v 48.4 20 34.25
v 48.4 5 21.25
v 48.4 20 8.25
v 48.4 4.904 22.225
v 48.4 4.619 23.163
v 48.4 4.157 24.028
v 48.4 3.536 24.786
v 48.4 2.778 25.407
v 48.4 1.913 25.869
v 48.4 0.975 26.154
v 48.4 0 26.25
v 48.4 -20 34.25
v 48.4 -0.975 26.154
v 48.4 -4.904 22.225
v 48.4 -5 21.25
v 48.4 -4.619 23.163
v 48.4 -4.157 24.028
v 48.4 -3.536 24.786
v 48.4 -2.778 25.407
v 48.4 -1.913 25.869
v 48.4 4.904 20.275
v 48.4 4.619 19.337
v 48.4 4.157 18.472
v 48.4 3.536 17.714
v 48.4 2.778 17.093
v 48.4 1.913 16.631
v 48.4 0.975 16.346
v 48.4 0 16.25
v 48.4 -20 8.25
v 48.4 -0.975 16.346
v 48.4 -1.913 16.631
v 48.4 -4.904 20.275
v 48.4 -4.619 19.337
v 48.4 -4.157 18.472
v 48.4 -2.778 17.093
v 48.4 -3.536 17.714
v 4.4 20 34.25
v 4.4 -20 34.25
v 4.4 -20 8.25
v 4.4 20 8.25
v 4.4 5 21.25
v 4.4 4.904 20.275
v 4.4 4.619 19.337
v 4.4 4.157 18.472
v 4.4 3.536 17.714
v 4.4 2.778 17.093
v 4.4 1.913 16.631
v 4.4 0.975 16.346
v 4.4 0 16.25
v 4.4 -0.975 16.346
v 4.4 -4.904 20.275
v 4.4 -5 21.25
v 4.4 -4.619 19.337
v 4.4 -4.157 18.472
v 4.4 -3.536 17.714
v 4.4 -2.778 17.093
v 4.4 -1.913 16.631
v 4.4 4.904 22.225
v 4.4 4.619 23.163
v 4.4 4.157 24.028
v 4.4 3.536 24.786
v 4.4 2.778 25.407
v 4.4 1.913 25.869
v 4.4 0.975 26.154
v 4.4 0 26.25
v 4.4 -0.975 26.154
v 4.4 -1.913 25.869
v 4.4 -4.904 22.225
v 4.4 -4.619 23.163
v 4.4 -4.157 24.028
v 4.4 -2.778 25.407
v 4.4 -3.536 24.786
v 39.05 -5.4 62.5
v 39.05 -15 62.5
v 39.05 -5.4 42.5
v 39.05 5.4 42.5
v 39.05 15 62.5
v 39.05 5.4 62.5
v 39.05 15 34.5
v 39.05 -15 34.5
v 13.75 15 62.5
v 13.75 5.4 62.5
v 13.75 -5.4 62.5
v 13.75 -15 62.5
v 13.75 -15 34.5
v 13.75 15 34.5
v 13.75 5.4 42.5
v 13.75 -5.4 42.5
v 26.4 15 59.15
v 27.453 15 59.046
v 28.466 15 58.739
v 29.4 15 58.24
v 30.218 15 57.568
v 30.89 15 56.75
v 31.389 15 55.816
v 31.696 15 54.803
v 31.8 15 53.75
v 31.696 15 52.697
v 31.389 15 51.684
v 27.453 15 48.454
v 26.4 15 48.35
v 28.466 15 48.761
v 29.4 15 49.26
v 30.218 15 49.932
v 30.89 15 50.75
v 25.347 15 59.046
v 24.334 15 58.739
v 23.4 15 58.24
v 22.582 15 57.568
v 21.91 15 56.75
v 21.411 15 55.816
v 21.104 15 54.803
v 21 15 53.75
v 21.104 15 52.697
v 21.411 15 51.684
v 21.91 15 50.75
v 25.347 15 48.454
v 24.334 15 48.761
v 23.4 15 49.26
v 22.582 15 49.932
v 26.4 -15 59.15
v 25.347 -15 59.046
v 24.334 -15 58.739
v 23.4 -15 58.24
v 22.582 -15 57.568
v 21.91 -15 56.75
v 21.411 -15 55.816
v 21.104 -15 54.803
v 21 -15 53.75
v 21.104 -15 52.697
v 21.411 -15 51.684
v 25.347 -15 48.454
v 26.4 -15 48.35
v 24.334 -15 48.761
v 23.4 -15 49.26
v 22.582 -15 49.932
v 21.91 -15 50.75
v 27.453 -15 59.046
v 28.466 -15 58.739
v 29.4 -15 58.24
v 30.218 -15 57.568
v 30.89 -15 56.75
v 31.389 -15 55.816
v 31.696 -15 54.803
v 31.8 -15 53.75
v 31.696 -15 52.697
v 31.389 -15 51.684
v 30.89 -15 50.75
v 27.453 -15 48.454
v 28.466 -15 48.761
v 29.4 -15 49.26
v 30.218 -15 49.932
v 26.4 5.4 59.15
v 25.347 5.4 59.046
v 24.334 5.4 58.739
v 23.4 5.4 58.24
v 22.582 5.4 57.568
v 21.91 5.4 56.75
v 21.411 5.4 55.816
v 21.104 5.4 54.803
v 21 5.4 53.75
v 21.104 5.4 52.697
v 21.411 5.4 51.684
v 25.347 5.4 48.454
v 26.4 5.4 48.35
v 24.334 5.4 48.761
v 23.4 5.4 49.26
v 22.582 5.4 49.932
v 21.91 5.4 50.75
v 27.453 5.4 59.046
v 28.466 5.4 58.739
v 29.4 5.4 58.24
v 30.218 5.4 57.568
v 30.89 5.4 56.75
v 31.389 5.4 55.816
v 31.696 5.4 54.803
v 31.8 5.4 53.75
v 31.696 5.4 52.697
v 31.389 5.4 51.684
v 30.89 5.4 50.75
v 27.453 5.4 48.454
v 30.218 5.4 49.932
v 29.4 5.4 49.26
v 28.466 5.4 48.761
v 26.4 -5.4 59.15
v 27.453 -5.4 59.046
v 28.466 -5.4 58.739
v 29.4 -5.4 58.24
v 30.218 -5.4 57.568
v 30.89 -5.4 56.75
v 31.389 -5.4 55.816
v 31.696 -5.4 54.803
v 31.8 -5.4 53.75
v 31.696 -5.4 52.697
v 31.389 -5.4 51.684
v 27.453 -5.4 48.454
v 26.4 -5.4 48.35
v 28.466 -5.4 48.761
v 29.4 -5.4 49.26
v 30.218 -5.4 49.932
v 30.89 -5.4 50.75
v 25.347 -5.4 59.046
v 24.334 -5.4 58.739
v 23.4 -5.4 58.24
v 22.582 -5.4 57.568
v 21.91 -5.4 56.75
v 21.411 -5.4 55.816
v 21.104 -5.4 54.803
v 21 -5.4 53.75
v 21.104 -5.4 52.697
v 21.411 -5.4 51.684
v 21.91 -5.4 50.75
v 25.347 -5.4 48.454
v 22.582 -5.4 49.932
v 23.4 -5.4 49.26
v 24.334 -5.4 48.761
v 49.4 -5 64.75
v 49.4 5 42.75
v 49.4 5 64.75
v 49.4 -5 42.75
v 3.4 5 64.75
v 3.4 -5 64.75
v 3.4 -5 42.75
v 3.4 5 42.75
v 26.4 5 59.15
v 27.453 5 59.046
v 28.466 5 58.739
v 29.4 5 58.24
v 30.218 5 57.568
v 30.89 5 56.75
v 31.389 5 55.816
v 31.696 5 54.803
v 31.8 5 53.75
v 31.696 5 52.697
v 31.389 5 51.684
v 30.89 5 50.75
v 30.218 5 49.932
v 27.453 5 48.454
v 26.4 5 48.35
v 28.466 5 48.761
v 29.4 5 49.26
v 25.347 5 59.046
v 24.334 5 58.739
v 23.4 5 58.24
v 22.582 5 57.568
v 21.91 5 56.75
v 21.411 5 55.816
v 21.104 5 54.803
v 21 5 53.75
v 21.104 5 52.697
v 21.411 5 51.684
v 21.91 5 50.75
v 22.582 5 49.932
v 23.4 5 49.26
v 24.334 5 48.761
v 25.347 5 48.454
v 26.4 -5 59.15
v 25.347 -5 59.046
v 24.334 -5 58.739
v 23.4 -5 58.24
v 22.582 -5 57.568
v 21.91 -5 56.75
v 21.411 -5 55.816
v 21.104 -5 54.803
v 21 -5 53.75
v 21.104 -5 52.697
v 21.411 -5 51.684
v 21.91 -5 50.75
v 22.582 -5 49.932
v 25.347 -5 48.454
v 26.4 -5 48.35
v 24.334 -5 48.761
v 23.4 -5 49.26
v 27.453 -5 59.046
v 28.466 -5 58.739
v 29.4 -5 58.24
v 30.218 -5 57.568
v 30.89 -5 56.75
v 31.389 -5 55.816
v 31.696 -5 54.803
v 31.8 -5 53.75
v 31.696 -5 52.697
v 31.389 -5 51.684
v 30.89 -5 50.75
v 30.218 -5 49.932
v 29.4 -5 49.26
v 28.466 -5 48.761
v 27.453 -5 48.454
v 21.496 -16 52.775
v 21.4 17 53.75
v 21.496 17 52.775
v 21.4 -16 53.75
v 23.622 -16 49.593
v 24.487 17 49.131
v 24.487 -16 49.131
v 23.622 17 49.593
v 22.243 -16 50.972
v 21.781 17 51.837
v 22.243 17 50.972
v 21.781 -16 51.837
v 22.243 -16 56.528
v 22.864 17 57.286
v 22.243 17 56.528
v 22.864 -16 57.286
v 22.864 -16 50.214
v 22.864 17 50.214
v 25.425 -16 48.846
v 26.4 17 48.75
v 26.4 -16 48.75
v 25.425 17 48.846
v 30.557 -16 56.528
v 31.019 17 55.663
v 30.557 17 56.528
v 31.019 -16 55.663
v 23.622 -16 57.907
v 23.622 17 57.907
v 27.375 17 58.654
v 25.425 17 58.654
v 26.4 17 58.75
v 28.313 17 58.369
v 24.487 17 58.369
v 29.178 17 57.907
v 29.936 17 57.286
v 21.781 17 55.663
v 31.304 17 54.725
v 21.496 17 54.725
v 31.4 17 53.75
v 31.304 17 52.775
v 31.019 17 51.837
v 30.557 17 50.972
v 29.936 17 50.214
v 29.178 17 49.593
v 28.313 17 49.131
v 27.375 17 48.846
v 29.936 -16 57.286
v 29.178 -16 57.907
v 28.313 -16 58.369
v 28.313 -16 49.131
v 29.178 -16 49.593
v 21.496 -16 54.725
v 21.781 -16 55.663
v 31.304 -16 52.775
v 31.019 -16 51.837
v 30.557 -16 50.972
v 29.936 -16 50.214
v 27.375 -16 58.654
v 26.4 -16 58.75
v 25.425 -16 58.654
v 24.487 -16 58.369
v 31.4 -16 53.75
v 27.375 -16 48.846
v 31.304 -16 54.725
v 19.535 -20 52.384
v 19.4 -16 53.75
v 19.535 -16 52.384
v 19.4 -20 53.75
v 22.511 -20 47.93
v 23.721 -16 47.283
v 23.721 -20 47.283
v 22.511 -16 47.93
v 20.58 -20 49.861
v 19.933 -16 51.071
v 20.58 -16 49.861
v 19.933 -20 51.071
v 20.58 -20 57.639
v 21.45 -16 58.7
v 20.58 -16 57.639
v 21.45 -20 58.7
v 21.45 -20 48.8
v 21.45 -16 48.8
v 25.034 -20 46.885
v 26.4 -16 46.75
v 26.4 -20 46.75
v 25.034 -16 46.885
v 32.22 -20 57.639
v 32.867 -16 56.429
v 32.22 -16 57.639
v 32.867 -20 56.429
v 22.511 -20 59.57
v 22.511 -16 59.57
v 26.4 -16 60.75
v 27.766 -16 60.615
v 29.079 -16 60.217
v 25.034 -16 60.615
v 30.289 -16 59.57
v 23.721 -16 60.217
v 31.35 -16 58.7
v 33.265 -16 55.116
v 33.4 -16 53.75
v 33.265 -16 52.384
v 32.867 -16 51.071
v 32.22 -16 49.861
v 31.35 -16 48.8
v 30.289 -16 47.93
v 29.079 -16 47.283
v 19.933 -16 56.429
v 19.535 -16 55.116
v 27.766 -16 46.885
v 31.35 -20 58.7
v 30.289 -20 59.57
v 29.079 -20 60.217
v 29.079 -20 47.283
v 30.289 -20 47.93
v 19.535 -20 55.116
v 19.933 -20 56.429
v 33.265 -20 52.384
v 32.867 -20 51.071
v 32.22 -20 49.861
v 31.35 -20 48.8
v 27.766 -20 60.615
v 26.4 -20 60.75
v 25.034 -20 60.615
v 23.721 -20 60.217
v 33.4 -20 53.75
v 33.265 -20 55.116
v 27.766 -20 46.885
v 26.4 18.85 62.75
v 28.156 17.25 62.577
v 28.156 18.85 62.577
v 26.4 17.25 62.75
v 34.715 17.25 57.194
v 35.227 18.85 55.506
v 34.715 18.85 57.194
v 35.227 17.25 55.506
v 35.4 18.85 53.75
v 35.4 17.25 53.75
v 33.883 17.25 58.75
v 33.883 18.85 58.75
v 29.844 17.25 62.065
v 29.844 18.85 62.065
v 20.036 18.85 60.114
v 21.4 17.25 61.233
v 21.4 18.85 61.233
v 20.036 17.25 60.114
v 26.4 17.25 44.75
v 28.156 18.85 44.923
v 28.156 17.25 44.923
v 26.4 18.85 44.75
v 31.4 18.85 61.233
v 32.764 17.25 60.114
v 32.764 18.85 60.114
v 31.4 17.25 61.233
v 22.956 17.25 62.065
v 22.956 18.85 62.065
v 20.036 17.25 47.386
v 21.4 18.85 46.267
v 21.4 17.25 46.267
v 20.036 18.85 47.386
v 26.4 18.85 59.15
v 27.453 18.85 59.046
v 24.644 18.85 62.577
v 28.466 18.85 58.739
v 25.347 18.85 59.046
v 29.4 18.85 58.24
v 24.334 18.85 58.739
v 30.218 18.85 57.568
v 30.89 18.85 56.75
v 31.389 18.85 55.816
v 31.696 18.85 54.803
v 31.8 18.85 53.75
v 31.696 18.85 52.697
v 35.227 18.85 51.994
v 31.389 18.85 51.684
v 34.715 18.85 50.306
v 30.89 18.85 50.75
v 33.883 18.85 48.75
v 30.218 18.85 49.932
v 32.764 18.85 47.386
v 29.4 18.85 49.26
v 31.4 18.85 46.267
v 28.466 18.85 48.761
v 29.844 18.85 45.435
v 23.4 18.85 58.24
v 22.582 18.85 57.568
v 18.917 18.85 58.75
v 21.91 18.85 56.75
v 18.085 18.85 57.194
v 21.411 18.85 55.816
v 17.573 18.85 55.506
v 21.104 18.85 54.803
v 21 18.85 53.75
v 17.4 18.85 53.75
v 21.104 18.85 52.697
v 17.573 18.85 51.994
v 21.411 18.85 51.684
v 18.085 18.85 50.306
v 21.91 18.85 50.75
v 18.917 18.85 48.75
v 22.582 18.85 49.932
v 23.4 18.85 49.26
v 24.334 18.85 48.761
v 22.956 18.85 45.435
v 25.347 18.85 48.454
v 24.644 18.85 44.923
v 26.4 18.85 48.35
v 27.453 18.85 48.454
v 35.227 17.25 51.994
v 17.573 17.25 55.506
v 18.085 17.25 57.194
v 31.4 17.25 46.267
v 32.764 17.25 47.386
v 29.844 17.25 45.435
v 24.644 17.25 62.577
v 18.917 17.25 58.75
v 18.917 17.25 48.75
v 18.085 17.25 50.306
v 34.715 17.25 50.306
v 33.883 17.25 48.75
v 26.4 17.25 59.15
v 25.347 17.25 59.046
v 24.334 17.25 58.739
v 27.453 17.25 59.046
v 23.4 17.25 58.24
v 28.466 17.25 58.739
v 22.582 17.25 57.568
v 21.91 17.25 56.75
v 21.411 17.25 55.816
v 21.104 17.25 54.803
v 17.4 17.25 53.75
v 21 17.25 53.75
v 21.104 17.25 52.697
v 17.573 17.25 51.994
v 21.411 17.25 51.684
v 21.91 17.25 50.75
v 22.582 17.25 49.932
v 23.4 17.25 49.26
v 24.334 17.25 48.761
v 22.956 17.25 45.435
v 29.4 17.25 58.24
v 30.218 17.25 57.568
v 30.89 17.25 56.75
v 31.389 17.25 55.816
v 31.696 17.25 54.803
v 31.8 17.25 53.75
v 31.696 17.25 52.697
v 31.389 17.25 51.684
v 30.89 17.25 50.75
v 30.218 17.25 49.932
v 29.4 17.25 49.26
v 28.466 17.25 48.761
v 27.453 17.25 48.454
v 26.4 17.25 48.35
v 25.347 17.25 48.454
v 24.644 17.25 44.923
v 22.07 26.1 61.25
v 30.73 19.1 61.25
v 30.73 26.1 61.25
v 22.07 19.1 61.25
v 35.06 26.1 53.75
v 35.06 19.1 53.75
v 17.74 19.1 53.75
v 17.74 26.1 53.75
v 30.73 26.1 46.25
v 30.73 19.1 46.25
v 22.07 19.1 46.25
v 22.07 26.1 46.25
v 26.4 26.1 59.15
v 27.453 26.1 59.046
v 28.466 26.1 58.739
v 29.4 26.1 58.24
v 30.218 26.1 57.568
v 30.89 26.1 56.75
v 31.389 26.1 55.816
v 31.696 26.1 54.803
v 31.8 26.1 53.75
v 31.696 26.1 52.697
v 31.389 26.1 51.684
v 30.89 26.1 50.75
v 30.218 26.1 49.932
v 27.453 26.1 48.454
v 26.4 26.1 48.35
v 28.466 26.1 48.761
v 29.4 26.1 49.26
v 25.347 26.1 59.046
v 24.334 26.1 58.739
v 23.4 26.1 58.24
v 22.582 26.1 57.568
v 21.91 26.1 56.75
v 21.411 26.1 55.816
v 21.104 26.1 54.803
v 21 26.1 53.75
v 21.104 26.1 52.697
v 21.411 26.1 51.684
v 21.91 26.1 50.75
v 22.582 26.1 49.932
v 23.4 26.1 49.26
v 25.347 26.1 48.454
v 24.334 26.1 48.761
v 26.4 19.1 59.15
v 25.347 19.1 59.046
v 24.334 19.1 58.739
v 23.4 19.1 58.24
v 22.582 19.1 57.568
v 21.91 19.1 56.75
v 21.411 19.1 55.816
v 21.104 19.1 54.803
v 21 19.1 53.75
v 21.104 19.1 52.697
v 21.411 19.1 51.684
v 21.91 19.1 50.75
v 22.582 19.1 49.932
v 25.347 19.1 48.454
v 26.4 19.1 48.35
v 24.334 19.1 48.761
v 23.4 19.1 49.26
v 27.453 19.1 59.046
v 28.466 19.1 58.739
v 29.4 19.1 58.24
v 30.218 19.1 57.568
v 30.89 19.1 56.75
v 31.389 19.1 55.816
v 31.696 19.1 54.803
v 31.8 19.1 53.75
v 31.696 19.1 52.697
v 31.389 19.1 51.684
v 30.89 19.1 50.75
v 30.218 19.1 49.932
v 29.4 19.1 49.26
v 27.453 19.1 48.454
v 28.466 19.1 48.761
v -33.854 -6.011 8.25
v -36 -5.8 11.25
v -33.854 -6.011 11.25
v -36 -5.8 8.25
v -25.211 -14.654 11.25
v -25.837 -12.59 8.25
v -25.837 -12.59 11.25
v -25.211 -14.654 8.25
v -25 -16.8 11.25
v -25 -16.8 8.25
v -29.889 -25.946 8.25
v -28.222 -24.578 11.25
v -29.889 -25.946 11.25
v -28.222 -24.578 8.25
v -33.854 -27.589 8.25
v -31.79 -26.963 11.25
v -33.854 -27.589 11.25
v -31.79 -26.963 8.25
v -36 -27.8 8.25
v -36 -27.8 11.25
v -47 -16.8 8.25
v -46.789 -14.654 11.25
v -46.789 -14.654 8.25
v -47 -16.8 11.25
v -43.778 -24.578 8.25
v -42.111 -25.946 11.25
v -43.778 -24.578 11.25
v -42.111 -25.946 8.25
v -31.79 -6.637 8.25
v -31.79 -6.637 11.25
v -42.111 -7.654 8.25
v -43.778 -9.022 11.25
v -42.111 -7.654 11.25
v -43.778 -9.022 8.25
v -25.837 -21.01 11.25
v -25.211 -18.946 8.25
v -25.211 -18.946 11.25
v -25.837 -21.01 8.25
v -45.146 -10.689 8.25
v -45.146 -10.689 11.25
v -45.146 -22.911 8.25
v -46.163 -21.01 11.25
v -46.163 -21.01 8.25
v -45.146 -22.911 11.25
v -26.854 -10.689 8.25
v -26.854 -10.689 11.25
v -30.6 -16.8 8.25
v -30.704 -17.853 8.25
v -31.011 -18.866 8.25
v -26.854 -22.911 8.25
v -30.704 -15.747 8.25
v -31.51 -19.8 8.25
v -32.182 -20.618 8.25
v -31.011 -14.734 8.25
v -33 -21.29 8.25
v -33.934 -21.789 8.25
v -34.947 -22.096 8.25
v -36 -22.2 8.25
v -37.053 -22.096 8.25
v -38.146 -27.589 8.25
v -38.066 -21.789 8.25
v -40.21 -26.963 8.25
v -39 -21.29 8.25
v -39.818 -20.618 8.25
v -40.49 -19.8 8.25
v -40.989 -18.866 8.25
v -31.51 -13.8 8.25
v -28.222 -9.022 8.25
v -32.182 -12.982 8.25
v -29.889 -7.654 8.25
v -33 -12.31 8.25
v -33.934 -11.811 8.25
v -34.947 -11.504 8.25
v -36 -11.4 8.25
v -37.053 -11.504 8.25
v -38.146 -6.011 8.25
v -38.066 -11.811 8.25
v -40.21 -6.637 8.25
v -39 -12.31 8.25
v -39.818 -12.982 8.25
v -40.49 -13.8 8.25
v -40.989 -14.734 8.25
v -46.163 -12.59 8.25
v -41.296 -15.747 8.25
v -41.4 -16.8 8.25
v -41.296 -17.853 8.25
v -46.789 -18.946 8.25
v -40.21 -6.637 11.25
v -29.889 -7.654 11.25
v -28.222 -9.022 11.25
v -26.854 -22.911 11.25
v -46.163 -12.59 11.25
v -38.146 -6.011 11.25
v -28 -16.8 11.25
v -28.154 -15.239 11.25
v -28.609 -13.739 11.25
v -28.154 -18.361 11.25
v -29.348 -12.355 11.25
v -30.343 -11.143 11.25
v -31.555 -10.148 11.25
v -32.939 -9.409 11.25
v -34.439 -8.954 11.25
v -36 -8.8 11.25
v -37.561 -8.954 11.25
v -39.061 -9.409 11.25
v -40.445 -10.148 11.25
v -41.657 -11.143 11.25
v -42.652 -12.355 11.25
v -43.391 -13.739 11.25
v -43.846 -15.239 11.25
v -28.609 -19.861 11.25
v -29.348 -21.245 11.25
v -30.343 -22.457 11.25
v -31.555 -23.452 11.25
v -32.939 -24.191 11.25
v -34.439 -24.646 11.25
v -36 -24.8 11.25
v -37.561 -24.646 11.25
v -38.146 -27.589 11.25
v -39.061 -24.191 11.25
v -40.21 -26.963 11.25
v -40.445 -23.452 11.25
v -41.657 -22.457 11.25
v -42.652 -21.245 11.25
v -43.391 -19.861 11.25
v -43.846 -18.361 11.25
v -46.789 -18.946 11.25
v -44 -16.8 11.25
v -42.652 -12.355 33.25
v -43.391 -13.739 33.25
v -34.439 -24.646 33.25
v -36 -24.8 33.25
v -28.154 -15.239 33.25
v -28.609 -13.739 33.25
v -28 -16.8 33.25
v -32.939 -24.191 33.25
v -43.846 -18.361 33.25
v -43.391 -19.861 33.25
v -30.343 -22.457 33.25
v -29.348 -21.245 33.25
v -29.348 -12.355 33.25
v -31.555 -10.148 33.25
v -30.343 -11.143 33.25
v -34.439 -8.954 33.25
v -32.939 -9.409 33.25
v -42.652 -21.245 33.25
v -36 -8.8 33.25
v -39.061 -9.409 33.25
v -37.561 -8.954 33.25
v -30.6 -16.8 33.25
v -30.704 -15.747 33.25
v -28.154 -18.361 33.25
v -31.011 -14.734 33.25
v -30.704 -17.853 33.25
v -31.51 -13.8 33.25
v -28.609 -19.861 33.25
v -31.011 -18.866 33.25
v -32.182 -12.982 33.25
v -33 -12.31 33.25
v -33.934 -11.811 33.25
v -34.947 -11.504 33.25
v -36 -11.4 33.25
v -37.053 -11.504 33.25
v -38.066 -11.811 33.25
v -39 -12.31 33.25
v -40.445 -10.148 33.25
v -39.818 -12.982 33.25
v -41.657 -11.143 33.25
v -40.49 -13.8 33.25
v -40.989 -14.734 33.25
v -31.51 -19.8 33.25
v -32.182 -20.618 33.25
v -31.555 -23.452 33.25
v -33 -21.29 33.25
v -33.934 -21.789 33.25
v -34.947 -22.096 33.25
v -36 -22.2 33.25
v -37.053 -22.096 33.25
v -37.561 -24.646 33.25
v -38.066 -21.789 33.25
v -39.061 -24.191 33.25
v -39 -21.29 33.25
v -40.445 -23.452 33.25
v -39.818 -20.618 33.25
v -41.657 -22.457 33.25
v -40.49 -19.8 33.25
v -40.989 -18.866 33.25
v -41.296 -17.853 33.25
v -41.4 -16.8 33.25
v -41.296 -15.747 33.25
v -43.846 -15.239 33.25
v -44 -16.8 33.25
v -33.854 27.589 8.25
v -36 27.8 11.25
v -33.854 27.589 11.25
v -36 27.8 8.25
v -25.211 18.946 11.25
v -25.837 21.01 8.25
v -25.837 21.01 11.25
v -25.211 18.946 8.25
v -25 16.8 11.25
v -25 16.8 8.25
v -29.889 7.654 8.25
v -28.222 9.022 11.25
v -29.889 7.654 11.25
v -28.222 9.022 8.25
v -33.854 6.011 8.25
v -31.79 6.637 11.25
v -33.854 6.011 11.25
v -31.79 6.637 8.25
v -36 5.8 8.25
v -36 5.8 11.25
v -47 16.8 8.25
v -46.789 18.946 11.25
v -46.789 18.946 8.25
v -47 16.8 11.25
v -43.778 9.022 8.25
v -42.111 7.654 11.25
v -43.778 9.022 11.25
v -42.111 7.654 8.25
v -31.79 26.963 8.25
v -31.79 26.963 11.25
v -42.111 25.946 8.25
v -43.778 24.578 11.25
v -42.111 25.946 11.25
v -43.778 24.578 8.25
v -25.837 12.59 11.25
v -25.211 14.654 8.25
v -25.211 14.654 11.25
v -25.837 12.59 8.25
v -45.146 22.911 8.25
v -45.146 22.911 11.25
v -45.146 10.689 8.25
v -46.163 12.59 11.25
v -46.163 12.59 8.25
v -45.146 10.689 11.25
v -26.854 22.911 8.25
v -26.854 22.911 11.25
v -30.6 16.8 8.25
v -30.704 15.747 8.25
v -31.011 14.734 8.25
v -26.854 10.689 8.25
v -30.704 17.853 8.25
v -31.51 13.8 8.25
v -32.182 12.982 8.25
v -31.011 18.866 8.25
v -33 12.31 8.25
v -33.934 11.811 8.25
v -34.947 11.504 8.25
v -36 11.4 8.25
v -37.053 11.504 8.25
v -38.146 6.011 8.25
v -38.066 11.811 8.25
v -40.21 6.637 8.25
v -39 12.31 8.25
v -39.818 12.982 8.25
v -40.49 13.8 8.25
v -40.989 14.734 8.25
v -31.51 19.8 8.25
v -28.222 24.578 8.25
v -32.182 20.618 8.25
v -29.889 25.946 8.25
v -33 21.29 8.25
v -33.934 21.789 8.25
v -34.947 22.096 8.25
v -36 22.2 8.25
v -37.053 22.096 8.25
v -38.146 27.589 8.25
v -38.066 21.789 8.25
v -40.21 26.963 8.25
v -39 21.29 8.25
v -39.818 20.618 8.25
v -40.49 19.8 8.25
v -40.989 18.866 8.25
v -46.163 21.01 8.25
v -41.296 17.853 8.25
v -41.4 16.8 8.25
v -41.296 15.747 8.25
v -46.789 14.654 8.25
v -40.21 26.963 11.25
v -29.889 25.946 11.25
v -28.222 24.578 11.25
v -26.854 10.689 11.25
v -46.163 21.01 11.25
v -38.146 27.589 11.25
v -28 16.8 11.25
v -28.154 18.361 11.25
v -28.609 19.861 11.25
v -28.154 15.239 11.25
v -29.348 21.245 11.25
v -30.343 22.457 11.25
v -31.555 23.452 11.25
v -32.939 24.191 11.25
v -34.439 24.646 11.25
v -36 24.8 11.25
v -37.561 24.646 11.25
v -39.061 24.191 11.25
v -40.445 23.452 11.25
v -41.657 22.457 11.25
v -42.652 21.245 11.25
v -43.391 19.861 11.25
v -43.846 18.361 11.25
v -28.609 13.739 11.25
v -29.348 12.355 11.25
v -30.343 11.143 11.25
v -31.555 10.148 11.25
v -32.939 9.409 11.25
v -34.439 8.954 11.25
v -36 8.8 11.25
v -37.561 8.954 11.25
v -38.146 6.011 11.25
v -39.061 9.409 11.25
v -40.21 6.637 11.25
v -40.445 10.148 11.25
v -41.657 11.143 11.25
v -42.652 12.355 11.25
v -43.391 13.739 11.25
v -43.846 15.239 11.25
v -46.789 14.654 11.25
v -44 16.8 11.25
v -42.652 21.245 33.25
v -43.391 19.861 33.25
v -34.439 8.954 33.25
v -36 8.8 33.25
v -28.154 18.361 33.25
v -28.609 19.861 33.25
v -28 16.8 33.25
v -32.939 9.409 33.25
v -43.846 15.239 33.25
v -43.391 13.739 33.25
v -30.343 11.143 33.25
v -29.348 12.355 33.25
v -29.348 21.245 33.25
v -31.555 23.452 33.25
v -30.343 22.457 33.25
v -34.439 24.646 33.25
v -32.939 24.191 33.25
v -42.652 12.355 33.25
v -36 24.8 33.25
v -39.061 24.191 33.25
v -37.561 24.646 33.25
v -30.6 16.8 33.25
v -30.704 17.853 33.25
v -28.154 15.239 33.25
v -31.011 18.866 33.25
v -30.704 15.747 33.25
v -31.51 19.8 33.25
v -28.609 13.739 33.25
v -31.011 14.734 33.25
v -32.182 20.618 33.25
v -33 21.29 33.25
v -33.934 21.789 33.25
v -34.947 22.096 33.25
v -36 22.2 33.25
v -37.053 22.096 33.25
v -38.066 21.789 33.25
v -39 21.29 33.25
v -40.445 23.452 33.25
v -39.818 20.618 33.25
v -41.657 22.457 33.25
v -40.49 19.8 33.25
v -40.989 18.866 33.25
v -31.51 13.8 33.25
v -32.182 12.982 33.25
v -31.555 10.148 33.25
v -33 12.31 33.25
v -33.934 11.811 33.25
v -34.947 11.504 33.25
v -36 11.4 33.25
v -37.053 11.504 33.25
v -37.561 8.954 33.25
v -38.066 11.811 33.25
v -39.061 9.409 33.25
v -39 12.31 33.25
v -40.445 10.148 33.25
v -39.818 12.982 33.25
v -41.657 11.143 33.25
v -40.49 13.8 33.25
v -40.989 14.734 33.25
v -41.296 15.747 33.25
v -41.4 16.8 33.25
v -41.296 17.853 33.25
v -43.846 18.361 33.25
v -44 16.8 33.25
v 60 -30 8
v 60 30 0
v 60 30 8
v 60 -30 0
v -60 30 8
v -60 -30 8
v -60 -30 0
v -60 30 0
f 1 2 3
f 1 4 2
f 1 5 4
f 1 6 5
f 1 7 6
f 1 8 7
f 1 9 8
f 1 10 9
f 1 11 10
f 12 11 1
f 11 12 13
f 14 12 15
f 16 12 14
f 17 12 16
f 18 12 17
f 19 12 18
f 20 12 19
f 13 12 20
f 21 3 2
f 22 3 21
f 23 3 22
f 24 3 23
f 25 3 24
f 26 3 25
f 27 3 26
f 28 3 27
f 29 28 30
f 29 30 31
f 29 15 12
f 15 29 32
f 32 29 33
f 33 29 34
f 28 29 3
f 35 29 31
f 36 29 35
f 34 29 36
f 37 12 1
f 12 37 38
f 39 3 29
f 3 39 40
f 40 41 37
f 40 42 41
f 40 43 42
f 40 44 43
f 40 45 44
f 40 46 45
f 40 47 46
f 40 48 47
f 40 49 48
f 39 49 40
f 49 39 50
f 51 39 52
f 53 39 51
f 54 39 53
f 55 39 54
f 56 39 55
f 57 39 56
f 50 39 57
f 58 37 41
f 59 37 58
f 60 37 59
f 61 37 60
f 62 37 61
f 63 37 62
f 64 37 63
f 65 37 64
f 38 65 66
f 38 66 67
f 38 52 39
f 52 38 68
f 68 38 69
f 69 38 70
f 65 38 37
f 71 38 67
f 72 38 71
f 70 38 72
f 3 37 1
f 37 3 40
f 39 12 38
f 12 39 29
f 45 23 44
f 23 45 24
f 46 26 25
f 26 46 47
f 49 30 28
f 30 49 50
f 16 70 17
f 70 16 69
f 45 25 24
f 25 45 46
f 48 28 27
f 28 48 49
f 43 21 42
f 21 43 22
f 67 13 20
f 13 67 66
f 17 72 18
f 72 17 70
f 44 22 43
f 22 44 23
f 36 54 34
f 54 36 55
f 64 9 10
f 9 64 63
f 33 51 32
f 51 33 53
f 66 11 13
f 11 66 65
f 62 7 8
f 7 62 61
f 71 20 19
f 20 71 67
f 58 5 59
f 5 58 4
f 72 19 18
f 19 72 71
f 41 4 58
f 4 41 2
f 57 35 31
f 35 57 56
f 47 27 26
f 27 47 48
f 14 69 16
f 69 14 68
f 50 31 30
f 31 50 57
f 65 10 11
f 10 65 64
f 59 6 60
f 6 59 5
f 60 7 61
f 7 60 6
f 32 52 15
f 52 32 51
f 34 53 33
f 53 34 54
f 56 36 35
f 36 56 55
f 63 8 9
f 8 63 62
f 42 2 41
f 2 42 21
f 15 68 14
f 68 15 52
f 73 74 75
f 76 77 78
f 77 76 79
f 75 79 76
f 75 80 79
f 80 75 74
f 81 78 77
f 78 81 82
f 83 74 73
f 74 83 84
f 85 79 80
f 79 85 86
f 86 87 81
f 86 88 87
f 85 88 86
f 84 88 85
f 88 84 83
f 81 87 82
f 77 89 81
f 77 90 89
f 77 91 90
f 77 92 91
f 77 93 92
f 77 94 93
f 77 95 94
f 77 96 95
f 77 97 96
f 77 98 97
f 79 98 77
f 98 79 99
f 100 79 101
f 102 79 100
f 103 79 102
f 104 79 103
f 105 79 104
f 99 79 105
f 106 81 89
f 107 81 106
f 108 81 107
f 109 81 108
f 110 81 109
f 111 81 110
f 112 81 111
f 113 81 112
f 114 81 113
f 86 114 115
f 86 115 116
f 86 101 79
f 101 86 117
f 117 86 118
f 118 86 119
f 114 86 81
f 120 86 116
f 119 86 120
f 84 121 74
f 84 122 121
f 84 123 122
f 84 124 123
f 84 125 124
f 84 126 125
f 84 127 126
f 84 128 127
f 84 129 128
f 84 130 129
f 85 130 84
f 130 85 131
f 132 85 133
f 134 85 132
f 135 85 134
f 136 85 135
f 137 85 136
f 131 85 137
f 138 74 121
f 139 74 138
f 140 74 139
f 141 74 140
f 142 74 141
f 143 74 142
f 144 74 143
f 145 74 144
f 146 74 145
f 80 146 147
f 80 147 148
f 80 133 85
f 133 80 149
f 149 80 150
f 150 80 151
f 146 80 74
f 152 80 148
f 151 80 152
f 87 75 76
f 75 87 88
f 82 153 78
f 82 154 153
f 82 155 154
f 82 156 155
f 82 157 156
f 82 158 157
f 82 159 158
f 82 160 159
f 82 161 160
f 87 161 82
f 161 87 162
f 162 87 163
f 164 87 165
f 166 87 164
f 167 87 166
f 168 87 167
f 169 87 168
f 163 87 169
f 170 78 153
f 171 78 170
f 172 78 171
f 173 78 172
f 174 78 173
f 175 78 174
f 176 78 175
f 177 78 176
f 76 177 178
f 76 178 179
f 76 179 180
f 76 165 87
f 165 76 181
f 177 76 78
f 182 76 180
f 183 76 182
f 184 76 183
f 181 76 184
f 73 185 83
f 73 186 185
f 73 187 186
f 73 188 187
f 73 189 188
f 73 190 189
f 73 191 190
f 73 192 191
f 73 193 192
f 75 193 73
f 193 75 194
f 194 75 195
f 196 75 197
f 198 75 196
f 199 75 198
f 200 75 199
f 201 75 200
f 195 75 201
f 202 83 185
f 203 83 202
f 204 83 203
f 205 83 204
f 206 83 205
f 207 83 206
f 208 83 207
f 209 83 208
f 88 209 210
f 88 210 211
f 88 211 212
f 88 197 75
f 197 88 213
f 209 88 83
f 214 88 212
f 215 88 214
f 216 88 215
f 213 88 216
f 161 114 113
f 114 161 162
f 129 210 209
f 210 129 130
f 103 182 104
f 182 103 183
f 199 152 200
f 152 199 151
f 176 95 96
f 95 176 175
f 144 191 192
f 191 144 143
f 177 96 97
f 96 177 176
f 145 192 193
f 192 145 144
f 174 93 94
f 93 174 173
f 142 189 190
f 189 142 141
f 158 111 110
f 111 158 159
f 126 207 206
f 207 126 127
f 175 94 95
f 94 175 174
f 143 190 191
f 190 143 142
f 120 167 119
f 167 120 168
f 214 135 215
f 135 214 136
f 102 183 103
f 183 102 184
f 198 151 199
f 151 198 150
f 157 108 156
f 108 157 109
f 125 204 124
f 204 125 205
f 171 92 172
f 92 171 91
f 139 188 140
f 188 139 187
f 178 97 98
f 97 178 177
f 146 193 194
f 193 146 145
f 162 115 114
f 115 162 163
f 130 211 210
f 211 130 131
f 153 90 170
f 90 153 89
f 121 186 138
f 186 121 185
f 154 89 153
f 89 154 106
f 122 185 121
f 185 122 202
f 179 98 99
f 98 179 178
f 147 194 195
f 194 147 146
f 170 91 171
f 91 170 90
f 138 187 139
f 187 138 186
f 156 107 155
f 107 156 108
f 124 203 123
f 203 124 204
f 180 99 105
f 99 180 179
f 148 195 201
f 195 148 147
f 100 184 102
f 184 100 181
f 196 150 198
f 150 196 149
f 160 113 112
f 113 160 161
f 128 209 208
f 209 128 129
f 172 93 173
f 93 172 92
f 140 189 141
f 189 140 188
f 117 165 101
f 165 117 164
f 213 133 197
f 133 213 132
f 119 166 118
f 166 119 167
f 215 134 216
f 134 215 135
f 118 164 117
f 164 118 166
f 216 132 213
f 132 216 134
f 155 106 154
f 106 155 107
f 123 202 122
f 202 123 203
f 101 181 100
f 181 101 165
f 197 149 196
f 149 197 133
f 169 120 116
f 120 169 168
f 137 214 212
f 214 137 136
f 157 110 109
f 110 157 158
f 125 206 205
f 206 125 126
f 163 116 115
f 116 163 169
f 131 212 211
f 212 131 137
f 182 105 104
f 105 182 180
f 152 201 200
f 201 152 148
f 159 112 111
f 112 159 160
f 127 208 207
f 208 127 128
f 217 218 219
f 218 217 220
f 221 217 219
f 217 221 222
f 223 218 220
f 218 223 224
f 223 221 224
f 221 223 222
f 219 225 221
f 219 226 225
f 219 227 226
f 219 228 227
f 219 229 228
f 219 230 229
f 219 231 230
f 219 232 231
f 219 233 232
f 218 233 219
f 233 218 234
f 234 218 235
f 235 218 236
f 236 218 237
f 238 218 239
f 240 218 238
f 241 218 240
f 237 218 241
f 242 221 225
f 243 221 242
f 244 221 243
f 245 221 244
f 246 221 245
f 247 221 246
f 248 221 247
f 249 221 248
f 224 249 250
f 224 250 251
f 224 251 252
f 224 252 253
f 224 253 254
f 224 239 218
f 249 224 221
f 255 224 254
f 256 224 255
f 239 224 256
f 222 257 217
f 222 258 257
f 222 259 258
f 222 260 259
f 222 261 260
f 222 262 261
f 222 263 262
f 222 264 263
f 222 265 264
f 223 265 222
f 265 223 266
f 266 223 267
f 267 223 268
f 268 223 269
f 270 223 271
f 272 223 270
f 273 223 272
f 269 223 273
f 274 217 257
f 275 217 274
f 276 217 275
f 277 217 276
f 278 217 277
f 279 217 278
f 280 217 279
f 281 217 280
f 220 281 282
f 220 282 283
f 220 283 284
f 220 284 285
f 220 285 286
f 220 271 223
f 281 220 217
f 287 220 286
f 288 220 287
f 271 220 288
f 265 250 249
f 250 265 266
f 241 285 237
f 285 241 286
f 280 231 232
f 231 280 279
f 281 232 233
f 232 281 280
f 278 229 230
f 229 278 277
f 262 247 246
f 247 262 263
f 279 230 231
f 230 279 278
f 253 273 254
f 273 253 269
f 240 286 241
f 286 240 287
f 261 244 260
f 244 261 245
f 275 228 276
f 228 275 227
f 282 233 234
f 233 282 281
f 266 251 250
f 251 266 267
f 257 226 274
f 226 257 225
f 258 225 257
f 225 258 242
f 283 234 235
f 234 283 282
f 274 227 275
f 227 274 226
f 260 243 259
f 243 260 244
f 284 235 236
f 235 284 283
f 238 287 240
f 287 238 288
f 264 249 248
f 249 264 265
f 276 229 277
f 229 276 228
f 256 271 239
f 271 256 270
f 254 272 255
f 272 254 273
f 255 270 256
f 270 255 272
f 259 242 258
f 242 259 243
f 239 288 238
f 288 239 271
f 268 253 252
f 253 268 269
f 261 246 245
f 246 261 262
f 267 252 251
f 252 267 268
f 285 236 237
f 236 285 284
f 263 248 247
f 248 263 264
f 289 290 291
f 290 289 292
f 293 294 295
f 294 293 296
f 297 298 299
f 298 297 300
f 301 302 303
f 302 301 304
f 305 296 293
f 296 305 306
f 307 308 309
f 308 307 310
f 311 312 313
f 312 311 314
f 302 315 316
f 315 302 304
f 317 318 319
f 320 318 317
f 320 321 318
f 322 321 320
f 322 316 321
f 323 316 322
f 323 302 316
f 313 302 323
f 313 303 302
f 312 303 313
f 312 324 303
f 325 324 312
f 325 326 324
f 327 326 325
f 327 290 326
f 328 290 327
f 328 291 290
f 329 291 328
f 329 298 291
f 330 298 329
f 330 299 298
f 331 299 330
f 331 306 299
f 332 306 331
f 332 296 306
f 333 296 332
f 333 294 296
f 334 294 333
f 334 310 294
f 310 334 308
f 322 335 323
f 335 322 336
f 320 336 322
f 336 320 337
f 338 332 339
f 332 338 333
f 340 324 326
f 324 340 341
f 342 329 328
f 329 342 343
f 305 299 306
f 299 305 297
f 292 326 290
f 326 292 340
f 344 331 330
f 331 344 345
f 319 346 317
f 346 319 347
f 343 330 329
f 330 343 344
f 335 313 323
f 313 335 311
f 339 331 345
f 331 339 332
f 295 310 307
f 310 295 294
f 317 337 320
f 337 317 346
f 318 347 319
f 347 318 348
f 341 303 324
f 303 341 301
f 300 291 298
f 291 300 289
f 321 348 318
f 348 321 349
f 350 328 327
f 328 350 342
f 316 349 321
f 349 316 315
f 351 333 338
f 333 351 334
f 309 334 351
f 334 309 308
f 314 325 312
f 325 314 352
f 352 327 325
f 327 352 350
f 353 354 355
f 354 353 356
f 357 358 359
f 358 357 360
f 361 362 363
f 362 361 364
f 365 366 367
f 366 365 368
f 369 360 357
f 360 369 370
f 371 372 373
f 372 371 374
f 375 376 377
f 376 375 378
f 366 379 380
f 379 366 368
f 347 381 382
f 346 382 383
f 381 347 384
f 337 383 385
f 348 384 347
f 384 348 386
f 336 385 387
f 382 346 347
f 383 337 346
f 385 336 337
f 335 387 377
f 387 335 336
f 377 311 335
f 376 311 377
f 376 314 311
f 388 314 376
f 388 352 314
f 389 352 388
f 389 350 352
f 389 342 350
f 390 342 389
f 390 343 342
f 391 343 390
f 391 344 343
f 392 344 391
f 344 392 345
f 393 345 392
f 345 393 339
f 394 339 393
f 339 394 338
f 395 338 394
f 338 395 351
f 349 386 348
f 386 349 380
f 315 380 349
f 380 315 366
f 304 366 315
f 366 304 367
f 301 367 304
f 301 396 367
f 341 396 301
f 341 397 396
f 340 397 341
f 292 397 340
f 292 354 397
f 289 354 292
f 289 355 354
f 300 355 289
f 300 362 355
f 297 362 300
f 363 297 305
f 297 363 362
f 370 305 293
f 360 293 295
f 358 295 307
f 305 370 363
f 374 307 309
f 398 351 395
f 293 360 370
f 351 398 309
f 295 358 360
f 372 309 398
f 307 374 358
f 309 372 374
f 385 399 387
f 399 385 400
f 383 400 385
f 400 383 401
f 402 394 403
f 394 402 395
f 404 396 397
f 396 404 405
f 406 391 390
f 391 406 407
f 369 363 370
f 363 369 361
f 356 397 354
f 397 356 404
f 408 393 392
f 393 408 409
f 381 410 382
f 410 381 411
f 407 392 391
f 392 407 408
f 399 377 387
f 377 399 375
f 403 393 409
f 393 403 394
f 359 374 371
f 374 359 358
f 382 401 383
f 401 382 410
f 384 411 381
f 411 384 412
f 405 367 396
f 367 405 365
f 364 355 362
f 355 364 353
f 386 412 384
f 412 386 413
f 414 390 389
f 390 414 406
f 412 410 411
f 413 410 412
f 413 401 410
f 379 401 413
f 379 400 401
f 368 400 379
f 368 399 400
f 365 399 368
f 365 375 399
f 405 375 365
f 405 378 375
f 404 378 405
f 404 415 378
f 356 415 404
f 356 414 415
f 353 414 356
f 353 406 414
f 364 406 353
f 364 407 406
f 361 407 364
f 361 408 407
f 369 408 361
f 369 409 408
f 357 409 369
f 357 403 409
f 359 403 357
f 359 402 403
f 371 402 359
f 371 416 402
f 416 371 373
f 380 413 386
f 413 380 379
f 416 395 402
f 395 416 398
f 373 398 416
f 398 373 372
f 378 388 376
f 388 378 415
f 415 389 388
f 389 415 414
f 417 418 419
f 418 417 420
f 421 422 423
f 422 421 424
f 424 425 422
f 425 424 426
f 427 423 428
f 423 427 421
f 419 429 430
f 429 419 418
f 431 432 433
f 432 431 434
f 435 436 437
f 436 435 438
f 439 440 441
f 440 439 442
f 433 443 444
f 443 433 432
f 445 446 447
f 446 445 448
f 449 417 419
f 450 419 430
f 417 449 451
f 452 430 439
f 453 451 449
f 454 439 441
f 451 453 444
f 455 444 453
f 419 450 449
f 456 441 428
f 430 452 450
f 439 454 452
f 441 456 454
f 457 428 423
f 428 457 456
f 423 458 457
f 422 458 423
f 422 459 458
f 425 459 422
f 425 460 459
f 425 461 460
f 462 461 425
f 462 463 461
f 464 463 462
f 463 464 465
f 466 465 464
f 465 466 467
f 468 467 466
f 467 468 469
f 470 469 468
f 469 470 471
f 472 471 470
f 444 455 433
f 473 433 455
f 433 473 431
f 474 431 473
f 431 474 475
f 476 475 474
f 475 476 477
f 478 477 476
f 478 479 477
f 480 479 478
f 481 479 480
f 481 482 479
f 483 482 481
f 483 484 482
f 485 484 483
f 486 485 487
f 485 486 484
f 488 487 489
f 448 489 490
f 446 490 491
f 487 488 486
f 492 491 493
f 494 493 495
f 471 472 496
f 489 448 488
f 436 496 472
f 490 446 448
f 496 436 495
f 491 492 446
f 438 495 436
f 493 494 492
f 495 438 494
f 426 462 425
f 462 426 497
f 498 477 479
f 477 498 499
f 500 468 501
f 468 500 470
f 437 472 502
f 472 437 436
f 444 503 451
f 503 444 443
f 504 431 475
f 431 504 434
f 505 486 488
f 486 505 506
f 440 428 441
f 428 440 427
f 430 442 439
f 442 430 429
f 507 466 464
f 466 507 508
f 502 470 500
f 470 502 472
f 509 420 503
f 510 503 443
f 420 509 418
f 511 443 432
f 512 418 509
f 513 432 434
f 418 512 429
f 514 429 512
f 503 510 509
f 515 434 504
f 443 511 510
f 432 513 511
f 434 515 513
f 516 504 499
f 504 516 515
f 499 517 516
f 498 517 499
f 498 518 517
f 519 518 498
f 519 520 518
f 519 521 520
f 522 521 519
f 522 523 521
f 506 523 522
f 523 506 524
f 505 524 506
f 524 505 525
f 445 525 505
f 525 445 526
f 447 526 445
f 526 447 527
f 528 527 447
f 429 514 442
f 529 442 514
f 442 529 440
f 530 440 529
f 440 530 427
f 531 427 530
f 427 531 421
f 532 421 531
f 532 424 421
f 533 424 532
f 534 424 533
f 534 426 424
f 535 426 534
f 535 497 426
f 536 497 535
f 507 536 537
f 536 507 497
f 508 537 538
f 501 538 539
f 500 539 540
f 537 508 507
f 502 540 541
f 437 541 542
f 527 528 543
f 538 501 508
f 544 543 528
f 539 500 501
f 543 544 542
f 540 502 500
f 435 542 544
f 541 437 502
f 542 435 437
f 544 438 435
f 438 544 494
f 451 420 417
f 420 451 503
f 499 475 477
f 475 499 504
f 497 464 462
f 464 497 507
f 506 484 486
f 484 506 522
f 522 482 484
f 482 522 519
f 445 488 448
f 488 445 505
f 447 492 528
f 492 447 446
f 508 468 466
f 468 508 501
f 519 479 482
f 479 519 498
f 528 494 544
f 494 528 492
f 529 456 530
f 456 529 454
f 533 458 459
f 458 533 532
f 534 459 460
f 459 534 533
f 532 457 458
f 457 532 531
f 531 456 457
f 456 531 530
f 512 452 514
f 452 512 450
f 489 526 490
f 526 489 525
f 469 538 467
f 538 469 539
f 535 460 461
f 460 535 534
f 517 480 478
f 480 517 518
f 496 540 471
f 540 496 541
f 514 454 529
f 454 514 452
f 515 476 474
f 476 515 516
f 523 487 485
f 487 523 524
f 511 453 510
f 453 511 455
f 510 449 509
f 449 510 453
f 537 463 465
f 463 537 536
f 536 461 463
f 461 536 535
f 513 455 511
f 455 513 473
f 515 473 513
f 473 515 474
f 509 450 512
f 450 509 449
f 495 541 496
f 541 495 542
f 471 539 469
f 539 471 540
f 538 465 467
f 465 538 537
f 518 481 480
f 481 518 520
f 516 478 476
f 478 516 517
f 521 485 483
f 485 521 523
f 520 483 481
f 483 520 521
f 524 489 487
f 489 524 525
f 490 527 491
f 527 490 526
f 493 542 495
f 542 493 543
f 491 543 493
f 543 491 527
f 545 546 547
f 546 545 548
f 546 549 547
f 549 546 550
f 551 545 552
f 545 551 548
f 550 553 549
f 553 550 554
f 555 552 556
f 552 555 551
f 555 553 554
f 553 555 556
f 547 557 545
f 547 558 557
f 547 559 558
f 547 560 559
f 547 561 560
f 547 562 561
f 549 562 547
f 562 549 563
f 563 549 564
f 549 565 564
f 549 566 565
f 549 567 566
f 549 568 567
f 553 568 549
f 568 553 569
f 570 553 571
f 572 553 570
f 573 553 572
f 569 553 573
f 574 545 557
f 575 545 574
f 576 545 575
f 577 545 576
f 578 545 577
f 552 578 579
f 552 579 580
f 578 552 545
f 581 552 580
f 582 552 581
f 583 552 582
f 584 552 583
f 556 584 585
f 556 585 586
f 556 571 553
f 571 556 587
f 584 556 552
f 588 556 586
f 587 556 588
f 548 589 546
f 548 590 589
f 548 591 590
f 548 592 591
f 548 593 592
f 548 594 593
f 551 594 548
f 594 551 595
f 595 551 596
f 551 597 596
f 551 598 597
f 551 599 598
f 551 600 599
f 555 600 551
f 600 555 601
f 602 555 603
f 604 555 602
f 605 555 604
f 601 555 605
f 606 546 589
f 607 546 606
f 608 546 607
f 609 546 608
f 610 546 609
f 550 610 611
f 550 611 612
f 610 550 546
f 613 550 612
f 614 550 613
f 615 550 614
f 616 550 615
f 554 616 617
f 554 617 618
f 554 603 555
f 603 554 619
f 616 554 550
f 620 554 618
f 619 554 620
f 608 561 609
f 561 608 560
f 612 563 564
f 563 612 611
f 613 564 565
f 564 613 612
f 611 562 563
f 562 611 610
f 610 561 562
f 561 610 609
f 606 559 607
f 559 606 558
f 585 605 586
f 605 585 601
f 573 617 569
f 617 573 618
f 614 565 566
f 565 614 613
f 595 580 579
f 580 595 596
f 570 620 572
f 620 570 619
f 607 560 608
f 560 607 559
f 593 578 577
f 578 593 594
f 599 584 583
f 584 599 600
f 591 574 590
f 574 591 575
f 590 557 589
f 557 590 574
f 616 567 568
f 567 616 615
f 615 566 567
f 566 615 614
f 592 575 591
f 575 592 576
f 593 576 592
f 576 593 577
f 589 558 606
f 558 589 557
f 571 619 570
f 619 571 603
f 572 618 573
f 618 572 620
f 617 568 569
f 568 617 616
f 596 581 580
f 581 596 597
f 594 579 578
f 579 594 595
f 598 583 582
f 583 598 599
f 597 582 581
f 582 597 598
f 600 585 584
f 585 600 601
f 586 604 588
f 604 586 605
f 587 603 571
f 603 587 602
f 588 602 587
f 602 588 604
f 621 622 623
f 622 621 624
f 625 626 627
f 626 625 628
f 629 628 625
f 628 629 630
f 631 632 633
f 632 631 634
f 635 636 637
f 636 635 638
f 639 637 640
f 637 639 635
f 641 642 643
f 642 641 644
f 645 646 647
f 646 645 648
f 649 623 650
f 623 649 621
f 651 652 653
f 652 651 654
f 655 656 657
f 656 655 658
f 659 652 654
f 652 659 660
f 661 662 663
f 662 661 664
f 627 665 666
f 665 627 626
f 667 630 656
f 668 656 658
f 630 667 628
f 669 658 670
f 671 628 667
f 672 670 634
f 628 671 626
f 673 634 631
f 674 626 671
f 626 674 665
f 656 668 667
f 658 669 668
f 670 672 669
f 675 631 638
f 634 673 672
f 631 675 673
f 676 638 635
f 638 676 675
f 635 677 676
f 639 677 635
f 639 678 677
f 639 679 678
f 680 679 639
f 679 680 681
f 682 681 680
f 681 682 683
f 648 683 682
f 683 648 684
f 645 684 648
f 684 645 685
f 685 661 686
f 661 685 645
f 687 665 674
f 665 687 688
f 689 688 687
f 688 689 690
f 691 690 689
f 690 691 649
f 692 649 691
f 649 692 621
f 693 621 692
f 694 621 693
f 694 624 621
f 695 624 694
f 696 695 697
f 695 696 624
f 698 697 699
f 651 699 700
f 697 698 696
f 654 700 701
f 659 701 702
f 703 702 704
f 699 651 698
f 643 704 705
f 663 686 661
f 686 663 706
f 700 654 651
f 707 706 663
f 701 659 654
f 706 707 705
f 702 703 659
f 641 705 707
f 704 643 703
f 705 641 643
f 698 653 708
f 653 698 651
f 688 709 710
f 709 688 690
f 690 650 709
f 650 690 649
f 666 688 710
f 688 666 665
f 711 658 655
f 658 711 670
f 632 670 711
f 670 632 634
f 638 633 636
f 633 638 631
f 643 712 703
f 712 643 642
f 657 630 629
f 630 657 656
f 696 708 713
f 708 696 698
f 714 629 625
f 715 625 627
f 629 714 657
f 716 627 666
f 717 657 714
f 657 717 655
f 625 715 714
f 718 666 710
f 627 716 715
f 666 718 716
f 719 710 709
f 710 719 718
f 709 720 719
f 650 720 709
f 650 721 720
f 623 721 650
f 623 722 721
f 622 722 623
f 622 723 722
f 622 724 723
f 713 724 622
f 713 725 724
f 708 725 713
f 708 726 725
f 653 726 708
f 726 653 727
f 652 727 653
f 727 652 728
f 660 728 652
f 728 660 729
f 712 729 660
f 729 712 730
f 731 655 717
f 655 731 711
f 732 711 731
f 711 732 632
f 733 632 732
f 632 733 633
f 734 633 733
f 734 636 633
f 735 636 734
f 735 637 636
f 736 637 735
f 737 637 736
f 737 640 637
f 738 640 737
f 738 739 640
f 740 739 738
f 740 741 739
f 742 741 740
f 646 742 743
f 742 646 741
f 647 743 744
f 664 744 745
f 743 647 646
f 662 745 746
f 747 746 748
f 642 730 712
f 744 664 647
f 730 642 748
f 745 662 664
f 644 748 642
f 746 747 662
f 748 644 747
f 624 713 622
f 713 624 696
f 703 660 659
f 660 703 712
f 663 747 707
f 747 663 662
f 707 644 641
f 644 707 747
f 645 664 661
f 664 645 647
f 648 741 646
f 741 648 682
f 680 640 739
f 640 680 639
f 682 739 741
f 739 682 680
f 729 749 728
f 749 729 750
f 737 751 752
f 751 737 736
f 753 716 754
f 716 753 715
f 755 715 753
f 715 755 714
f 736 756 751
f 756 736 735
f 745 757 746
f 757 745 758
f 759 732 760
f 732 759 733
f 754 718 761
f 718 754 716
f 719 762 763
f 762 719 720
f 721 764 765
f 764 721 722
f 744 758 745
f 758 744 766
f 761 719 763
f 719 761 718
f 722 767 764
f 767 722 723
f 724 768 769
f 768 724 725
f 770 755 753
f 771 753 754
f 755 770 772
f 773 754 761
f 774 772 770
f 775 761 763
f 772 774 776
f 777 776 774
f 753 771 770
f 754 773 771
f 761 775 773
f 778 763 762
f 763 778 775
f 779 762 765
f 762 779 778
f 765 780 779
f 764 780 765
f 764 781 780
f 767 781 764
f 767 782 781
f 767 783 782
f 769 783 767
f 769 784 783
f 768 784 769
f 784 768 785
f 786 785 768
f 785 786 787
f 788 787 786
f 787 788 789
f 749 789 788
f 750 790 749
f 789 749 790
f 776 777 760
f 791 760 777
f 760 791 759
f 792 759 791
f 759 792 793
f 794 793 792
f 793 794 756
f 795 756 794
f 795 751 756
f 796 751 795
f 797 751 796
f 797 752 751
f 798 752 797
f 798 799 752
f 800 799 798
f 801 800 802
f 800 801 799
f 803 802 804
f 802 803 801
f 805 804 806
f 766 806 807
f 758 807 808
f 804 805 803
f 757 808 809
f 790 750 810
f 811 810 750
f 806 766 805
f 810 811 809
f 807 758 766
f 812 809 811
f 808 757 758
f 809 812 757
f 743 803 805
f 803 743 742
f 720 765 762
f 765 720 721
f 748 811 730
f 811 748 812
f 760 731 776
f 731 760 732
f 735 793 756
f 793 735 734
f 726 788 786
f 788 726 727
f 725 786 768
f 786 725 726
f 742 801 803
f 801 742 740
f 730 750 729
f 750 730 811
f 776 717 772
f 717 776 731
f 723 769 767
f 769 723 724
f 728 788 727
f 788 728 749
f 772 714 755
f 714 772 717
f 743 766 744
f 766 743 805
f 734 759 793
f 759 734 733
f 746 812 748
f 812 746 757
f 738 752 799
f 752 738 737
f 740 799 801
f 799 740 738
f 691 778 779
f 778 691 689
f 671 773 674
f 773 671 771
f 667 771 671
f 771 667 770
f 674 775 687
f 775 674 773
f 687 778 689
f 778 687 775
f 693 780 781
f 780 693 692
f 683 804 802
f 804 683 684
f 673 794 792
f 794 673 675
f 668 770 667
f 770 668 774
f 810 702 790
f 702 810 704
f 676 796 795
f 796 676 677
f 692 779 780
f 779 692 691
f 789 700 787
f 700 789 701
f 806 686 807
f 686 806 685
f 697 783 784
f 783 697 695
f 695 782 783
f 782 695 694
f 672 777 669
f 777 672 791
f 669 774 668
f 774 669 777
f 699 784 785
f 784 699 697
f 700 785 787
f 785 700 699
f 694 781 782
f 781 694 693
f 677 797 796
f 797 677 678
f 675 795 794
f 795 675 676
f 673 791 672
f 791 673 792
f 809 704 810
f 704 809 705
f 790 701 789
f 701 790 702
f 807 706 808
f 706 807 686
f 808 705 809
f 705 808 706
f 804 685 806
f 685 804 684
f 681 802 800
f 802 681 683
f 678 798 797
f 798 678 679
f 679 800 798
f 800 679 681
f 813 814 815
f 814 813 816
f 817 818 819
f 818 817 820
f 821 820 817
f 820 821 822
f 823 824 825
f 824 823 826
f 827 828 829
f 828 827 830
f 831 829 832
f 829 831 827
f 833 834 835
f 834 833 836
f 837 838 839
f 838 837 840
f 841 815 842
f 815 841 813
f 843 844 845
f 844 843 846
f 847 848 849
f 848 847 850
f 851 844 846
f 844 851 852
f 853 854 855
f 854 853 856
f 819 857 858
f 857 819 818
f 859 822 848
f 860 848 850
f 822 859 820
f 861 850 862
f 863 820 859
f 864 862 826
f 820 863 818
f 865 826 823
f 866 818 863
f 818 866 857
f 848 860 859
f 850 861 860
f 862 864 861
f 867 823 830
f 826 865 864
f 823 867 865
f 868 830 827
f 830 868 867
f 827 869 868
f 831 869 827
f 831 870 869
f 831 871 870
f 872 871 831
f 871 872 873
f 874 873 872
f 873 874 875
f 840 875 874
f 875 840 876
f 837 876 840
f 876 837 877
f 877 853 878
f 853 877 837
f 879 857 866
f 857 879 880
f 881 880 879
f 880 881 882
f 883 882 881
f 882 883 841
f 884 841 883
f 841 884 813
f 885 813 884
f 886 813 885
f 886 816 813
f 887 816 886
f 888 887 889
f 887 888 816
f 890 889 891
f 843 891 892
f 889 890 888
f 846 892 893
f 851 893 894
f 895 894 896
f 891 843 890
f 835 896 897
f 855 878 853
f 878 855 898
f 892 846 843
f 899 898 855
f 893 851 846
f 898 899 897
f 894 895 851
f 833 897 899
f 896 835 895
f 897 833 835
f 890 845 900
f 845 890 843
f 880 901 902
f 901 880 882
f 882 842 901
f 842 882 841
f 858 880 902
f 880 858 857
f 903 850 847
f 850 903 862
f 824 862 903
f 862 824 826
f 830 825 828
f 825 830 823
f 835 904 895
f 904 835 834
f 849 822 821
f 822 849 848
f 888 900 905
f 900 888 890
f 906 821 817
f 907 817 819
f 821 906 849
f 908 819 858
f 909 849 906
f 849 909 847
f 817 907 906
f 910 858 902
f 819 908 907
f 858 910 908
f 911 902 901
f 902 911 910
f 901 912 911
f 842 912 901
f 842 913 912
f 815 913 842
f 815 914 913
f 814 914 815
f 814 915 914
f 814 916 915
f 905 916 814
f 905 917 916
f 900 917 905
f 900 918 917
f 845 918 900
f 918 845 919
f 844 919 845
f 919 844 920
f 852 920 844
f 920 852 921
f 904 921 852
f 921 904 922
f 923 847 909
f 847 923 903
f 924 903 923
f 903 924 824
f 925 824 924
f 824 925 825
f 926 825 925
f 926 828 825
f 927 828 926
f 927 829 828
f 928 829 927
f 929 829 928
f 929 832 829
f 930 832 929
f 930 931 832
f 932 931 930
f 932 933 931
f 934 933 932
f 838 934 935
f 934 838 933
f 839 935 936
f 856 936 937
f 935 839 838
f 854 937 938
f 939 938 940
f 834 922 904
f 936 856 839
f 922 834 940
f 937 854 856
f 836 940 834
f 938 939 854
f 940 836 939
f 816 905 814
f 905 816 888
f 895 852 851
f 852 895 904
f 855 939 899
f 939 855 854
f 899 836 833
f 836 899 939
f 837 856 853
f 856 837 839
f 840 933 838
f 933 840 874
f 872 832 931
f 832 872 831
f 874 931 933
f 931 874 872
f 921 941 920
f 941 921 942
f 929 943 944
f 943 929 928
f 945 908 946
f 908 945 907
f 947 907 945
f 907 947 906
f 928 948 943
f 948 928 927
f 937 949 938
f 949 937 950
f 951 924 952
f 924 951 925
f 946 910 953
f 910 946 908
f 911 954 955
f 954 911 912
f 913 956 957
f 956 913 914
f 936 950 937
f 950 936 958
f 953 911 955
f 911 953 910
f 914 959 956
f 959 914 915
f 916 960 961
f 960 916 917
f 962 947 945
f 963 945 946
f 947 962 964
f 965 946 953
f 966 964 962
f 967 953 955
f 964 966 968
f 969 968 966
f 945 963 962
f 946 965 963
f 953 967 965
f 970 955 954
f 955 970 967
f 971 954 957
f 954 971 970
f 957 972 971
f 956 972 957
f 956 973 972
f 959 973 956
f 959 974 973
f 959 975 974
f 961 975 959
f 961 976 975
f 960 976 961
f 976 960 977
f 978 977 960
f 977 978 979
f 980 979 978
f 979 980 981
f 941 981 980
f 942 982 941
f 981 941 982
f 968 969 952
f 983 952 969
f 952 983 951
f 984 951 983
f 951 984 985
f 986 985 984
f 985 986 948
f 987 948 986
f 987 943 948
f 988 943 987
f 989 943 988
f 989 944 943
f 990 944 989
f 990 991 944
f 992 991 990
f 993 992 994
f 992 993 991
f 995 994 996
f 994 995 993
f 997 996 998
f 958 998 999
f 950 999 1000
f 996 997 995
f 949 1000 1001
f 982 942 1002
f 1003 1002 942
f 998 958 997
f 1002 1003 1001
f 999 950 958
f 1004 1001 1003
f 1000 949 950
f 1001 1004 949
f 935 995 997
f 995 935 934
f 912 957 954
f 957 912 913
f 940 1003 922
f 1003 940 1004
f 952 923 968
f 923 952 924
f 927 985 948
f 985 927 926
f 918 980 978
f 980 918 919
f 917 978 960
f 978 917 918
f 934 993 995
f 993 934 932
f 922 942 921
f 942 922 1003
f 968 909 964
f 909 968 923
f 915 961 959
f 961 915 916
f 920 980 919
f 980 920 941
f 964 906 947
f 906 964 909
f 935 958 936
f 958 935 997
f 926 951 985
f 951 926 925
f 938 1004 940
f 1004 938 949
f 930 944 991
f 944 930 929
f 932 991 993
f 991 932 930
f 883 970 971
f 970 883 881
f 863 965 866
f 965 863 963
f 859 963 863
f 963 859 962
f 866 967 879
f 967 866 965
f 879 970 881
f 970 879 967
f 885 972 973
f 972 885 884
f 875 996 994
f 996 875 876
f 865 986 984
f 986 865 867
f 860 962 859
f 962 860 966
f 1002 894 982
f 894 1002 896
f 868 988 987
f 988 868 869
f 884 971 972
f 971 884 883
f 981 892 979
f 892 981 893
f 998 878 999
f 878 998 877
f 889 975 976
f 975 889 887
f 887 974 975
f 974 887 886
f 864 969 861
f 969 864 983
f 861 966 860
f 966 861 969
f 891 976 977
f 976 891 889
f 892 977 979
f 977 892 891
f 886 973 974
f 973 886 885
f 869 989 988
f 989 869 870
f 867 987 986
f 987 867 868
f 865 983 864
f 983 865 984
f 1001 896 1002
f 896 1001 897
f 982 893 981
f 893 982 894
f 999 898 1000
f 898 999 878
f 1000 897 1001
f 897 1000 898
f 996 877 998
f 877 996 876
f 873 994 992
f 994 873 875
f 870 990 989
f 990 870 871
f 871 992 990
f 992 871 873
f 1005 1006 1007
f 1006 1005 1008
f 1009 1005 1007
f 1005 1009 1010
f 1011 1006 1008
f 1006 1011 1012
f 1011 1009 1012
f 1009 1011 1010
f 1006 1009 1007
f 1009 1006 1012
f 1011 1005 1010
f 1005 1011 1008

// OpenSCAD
$fn = 32;

// ------------------------------------------------------------------------
// Indexing jig: plate 120 x 60 mm, pin d10
// Every part is its own module, assembly() places every instance.
// ------------------------------------------------------------------------

// --- part 1 ---
module jig_plate() {
  difference() {
    translate([-60, -30, 0]) cube([120, 60, 8]);
  }
}

// --- part 2 ---
module locator_block() {
  difference() {
    translate([-22, -20, 0]) cube([44, 40, 26]);
    translate([0, 0, 13]) rotate([0, 90, 0]) cylinder(h = 46, d = 10, center = true);
  }
}

// --- part 3 ---
module index_fork() {
  difference() {
    translate([-12.65, -15, 0]) cube([25.3, 30, 28]);
    translate([-13.65, -5.4, 8]) cube([27.3, 10.8, 21]);
    translate([0, 0, 19.25]) rotate([90, 0, 0]) cylinder(h = 32, d = 10.8, center = true);
  }
}

// --- part 4 ---
module index_arm() {
  difference() {
    translate([-23, -5, 0]) cube([46, 10, 22]);
    translate([0, 0, 11]) rotate([90, 0, 0]) cylinder(h = 12, d = 10.8, center = true);
  }
}

// --- part 5 ---
module index_pin() {
  rotate([0, 90, 0]) cylinder(h = 34, d = 10, center = true);
  translate([-20, 0, 0]) rotate([0, 90, 0]) cylinder(h = 4, d = 14);
}

// --- part 6 ---
module pin_washer() {
  difference() {
      translate([0, 0, 0]) cylinder(h = 1.6, d = 18);
      translate([0, 0, -1]) cylinder(h = 3.6, d = 10.8);
    }
}

// --- part 7 ---
module lock_nut() {
  difference() {
    linear_extrude(height = 7) polygon(points = [[8.66, 0], [4.33, 7.5], [-4.33, 7.5], [-8.66, 0], [-4.33, -7.5], [4.33, -7.5]]);
    translate([0, 0, -1]) cylinder(h = 9, d = 10.8);
  }
}

// --- part 8 ---
module guide_bush_a() {
  difference() {
    union() {
      cylinder(h = 3, d = 22);
      translate([0, 0, 3]) cylinder(h = 22, d = 16);
    }
    translate([0, 0, -1]) cylinder(h = 27, d = 10.8);
  }
}

// --- part 9 ---
module guide_bush_b() {
  difference() {
    union() {
      cylinder(h = 3, d = 22);
      translate([0, 0, 3]) cylinder(h = 22, d = 16);
    }
    translate([0, 0, -1]) cylinder(h = 27, d = 10.8);
  }
}

// --- assembly ---
module assembly() {
  color([0.80, 0.24, 0.20]) translate([0, 0, 0]) rotate([0, 0, 0]) jig_plate();
  color([0.20, 0.45, 0.75]) translate([26.4, 0, 8.25]) rotate([0, 0, 0]) locator_block();
  color([0.25, 0.62, 0.32]) translate([26.4, 0, 34.5]) rotate([0, 0, 0]) index_fork();
  color([0.92, 0.70, 0.18]) translate([26.4, 0, 42.75]) rotate([0, 0, 0]) index_arm();
  color([0.58, 0.35, 0.70]) translate([26.4, 0, 53.75]) rotate([0, 0, 90]) index_pin();
  color([0.16, 0.66, 0.66]) translate([26.4, 18.85, 53.75]) rotate([90, 0, 0]) pin_washer();
  color([0.85, 0.48, 0.18]) translate([26.4, 26.1, 53.75]) rotate([90, 0, 0]) lock_nut();
  color([0.55, 0.60, 0.65]) translate([-36, -16.8, 8.25]) rotate([0, 0, 0]) guide_bush_a();
  color([0.75, 0.30, 0.55]) translate([-36, 16.8, 8.25]) rotate([0, 0, 0]) guide_bush_b();
}

assembly();
